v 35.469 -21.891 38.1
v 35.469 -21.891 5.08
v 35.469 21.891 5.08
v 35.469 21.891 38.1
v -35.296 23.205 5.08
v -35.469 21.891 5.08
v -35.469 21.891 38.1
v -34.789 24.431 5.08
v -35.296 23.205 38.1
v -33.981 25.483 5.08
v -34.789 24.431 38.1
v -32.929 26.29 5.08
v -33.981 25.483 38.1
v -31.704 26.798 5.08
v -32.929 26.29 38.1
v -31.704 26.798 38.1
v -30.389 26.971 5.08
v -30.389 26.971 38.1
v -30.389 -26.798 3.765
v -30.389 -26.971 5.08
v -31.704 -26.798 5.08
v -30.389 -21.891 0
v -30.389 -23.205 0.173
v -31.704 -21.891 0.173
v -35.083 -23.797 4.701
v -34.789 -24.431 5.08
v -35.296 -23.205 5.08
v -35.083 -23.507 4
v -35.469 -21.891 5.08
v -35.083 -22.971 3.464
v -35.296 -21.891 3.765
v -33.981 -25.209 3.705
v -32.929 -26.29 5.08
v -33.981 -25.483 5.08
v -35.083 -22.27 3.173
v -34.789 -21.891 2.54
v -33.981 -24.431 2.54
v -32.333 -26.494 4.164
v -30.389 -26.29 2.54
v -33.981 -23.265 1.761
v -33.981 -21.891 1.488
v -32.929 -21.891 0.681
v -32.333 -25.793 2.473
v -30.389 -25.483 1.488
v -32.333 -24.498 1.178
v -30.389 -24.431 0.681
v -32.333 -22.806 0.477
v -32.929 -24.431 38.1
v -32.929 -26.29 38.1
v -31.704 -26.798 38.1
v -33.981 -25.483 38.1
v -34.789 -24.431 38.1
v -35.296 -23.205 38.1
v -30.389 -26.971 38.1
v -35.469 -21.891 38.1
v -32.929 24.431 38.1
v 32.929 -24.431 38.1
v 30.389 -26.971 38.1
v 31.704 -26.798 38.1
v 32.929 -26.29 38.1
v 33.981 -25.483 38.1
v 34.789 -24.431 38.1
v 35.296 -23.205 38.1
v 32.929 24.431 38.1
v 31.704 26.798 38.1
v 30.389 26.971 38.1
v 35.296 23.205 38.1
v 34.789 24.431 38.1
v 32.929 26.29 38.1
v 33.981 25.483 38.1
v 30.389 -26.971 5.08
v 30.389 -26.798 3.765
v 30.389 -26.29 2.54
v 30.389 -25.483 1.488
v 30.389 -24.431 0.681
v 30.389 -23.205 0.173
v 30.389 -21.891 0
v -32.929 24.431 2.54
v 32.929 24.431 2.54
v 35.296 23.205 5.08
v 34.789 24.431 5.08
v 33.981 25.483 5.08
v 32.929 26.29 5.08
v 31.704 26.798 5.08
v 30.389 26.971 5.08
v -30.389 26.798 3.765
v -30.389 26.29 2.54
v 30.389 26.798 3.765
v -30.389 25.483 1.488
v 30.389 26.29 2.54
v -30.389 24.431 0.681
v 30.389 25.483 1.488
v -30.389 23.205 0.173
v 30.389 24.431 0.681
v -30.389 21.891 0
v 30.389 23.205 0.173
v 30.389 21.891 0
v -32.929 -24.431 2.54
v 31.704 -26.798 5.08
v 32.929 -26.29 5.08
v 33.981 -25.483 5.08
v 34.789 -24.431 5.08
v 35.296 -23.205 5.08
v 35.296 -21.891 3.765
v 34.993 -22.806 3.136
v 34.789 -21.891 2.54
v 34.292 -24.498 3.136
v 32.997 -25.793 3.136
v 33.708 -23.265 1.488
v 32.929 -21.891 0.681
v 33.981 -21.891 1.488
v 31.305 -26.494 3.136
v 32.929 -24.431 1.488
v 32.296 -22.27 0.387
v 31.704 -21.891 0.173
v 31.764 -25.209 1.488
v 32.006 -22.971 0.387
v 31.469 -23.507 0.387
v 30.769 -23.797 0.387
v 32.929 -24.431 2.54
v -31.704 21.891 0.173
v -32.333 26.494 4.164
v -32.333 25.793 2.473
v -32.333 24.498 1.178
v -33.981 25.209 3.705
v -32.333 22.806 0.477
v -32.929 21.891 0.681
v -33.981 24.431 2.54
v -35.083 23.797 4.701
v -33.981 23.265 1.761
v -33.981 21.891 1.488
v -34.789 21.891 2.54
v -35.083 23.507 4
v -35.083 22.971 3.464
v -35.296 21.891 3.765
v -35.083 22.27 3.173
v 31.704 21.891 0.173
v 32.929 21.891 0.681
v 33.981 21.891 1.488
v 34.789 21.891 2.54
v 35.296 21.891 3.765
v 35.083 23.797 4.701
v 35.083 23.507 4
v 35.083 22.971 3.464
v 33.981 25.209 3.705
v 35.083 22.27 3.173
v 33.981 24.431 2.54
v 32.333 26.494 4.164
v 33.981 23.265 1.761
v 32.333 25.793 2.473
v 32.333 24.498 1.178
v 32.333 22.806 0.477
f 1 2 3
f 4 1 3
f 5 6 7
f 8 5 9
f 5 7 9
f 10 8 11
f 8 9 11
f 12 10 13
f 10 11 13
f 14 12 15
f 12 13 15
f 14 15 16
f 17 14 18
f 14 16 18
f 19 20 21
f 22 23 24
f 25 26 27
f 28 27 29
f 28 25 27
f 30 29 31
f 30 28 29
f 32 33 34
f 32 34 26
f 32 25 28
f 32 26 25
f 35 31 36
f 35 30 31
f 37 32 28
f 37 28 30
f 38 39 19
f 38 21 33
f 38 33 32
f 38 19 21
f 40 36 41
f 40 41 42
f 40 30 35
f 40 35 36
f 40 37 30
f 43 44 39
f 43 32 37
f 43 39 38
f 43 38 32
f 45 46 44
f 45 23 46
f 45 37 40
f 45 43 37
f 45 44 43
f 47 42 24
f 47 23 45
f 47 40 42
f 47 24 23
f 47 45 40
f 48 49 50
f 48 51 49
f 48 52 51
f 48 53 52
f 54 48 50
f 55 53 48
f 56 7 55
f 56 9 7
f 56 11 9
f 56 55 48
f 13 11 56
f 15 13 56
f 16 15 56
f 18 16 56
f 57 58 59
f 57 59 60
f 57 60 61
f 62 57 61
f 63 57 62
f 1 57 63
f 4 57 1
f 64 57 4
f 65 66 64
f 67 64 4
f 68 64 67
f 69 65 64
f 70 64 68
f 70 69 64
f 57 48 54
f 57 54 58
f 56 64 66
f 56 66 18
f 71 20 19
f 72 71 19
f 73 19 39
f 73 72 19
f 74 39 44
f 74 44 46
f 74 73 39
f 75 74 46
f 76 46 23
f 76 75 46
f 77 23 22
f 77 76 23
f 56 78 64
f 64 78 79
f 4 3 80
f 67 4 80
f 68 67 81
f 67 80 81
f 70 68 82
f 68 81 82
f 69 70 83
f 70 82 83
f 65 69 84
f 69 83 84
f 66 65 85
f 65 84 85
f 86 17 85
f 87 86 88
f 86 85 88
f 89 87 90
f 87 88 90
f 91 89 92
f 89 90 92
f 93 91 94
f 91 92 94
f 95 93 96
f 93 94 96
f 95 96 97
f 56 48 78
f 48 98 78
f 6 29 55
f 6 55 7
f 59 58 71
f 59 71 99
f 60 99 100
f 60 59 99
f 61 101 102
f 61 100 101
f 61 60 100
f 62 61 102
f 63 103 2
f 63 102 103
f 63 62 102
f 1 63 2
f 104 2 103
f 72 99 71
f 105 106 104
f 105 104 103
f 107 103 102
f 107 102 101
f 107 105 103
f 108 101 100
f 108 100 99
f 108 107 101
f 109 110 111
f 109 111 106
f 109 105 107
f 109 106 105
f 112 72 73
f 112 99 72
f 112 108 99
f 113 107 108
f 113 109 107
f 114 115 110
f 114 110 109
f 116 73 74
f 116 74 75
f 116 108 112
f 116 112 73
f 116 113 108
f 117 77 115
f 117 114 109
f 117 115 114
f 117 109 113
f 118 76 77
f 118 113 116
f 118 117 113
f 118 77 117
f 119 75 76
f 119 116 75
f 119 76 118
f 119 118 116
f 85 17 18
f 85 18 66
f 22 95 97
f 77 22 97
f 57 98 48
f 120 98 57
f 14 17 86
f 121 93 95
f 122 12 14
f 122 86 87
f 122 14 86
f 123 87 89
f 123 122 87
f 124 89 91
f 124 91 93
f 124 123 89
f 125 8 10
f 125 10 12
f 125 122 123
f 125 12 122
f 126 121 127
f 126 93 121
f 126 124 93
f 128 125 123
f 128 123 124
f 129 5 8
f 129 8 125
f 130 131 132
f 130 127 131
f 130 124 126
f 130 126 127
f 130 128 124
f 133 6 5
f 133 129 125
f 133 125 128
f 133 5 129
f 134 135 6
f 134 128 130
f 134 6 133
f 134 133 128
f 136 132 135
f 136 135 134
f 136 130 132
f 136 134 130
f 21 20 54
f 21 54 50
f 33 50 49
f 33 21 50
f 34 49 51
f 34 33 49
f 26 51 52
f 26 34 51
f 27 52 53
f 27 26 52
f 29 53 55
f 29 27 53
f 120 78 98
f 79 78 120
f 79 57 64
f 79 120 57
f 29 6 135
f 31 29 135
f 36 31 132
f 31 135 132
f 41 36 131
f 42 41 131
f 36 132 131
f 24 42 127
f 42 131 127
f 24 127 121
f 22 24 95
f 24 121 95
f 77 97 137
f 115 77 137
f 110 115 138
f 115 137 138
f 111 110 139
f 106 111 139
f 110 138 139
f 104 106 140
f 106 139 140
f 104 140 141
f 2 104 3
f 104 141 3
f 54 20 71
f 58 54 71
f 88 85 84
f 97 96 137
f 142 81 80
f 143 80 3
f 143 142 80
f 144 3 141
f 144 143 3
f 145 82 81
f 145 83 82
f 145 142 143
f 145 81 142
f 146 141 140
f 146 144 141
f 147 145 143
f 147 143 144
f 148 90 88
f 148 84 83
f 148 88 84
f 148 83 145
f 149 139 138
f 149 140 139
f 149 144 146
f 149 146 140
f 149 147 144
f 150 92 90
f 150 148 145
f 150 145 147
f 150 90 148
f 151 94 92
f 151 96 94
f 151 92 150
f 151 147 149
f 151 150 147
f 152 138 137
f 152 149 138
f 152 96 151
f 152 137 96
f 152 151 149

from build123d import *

# Parameters (mm, degrees)
F0_W         = 70.9387809038
F0_H         = 53.9411939681
F1_DEPTH     = 38.1
F2_T         = -2.54
F3_R         = 5.08
F4_T1_DEPTH  = 43.7811939681
F4_T3_DEPTH  = 45.72
F4_S7_W      = 5.08
F4_S7_H      = 5.08
F4_T8_DEPTH  = 5.08
F4_S13_W     = 5.08
F4_S13_H     = 5.08
F4_T14_DEPTH = 5.08
F4_T18_ANGLE = 90
F4_T20_ANGLE = 90


# Not quite as in the source:
# - a fillet or chamfer that OpenCascade refuses, or shapes differently, is made with other operations: its cross-section is extruded or revolved along the edge and cut away or added


with BuildPart() as f1:
    # F0 (on Top) → F1 (new body)
    with BuildSketch(Plane.XY):
        Rectangle(F0_W, F0_H)
    extrude(amount=F1_DEPTH)

    # F2
    f2_openings = [f1.faces().sort_by_distance(p)[0] for p in [
        (0, 0, 38.1),
    ]]
    offset(amount=F2_T, openings=f2_openings)

    # F3
    f3_edges = [f1.edges().sort_by_distance(p)[0] for p in [
        (0, 26.970597, 0),
        (0, -26.970597, 0),
        (-35.46939, 26.970597, 19.05),
        (35.46939, -26.970597, 19.05),
    ]]
    fillet(f3_edges, radius=F3_R)

    # F4: fillet of radius 5.08 on 3 edges, made by hand

    # F4_s2 → F4_t1 (cut)
    with BuildSketch(Plane.XZ.offset(-21.890596984)):
        with BuildLine():
            ThreePointArc((30.3893904519, 0), (33.9814929003, 1.4878975516), (35.4693904519, 5.08))
            Line((35.4693904519, 5.08), (35.4693904519, 0))
            Line((35.4693904519, 0), (30.3893904519, 0))
        make_face()
        with BuildLine():
            ThreePointArc((-35.4693904519, 5.08), (-33.9814929003, 1.4878975516), (-30.3893904519, 0))
            Line((-30.3893904519, 0), (-35.4693904519, 0))
            Line((-35.4693904519, 0), (-35.4693904519, 5.08))
        make_face()
    extrude(amount=F4_T1_DEPTH, mode=Mode.SUBTRACT)

    # F4_s4 → F4_t3 (cut)
    with BuildSketch(Plane.XY.offset(5.08)):
        with BuildLine():
            ThreePointArc((-30.3893904519, -26.970596984), (-33.9814929003, -25.4826994325), (-35.4693904519, -21.890596984))
            Line((-35.4693904519, -21.890596984), (-35.4693904519, -26.970596984))
            Line((-35.4693904519, -26.970596984), (-30.3893904519, -26.970596984))
        make_face()
        with BuildLine():
            ThreePointArc((35.4693904519, 21.890596984), (33.9814929003, 25.4826994325), (30.3893904519, 26.970596984))
            Line((30.3893904519, 26.970596984), (35.4693904519, 26.970596984))
            Line((35.4693904519, 26.970596984), (35.4693904519, 21.890596984))
        make_face()
    extrude(amount=F4_T3_DEPTH, mode=Mode.SUBTRACT)


with BuildPart() as f4_tool6:
    # F4_s7 → F4_t8 (new body)
    with BuildSketch(Plane.YZ.offset(-30.3893904519)):
        with Locations((24.430596984, 2.54)):
            Rectangle(F4_S7_W, F4_S7_H)
    extrude(amount=-F4_T8_DEPTH)

    # F4_s9 → F4_t10 (revolve, cut)
    with BuildSketch(Plane(origin=(-30.3893904519, 21.890596984, 5.08), x_dir=(0, -0.7071067812, 0.7071067812), z_dir=(0, -0.7071067812, -0.7071067812))):
        with BuildLine():
            ThreePointArc((0, -5.08), (5.08, 0), (0, 5.08))
            Line((0, 5.08), (0, -5.08))
        make_face()
    revolve(axis=Axis((-30.3893904519, 21.890596984, 5.08), (-1, 0, 0)), mode=Mode.SUBTRACT)


with BuildPart() as f1_1:
    add(f1.part)

    # F4_t5: cut F4_tool6
    add(f4_tool6.part, mode=Mode.SUBTRACT)


with BuildPart() as f4_tool12:
    # F4_s13 → F4_t14 (new body)
    with BuildSketch(Plane.XY.offset(5.08)):
        with Locations((32.9293904519, -24.430596984)):
            Rectangle(F4_S13_W, F4_S13_H)
    extrude(amount=-F4_T14_DEPTH)

    # F4_s15 → F4_t16 (revolve, cut)
    with BuildSketch(Plane(origin=(30.3893904519, -21.890596984, 5.08), x_dir=(-0.7071067812, 0.7071067812, 0), z_dir=(-0.7071067812, -0.7071067812, 0))):
        with BuildLine():
            ThreePointArc((0, -5.08), (5.08, 0), (0, 5.08))
            Line((0, 5.08), (0, -5.08))
        make_face()
    revolve(axis=Axis((30.3893904519, -21.890596984, 5.08), (0, 0, -1)), mode=Mode.SUBTRACT)


with BuildPart() as f1_2:
    add(f1_1.part)

    # F4_t11: cut F4_tool12
    add(f4_tool12.part, mode=Mode.SUBTRACT)

    # F4_s17 → F4_t18 (revolve, cut)
    with BuildSketch(Plane.XY.offset(5.08)):
        with BuildLine():
            ThreePointArc((-35.4693904519, -21.890596984), (-33.9814929003, -25.4826994325), (-30.3893904519, -26.970596984))
            Line((-30.3893904519, -26.970596984), (-35.4693904519, -26.970596984))
            Line((-35.4693904519, -26.970596984), (-35.4693904519, -21.890596984))
        make_face()
    revolve(axis=Axis((-35.4693904519, -21.890596984, 5.08), (1, 0, 0)), revolution_arc=F4_T18_ANGLE, mode=Mode.SUBTRACT)

    # F4_s19 → F4_t20 (revolve, cut)
    with BuildSketch(Plane.XY.offset(5.08)):
        with BuildLine():
            ThreePointArc((35.4693904519, 21.890596984), (33.9814929003, 25.4826994325), (30.3893904519, 26.970596984))
            Line((30.3893904519, 26.970596984), (35.4693904519, 26.970596984))
            Line((35.4693904519, 26.970596984), (35.4693904519, 21.890596984))
        make_face()
    revolve(axis=Axis((35.4693904519, 21.890596984, 5.08), (-1, 0, 0)), revolution_arc=F4_T20_ANGLE, mode=Mode.SUBTRACT)


solid = f1_2.part
